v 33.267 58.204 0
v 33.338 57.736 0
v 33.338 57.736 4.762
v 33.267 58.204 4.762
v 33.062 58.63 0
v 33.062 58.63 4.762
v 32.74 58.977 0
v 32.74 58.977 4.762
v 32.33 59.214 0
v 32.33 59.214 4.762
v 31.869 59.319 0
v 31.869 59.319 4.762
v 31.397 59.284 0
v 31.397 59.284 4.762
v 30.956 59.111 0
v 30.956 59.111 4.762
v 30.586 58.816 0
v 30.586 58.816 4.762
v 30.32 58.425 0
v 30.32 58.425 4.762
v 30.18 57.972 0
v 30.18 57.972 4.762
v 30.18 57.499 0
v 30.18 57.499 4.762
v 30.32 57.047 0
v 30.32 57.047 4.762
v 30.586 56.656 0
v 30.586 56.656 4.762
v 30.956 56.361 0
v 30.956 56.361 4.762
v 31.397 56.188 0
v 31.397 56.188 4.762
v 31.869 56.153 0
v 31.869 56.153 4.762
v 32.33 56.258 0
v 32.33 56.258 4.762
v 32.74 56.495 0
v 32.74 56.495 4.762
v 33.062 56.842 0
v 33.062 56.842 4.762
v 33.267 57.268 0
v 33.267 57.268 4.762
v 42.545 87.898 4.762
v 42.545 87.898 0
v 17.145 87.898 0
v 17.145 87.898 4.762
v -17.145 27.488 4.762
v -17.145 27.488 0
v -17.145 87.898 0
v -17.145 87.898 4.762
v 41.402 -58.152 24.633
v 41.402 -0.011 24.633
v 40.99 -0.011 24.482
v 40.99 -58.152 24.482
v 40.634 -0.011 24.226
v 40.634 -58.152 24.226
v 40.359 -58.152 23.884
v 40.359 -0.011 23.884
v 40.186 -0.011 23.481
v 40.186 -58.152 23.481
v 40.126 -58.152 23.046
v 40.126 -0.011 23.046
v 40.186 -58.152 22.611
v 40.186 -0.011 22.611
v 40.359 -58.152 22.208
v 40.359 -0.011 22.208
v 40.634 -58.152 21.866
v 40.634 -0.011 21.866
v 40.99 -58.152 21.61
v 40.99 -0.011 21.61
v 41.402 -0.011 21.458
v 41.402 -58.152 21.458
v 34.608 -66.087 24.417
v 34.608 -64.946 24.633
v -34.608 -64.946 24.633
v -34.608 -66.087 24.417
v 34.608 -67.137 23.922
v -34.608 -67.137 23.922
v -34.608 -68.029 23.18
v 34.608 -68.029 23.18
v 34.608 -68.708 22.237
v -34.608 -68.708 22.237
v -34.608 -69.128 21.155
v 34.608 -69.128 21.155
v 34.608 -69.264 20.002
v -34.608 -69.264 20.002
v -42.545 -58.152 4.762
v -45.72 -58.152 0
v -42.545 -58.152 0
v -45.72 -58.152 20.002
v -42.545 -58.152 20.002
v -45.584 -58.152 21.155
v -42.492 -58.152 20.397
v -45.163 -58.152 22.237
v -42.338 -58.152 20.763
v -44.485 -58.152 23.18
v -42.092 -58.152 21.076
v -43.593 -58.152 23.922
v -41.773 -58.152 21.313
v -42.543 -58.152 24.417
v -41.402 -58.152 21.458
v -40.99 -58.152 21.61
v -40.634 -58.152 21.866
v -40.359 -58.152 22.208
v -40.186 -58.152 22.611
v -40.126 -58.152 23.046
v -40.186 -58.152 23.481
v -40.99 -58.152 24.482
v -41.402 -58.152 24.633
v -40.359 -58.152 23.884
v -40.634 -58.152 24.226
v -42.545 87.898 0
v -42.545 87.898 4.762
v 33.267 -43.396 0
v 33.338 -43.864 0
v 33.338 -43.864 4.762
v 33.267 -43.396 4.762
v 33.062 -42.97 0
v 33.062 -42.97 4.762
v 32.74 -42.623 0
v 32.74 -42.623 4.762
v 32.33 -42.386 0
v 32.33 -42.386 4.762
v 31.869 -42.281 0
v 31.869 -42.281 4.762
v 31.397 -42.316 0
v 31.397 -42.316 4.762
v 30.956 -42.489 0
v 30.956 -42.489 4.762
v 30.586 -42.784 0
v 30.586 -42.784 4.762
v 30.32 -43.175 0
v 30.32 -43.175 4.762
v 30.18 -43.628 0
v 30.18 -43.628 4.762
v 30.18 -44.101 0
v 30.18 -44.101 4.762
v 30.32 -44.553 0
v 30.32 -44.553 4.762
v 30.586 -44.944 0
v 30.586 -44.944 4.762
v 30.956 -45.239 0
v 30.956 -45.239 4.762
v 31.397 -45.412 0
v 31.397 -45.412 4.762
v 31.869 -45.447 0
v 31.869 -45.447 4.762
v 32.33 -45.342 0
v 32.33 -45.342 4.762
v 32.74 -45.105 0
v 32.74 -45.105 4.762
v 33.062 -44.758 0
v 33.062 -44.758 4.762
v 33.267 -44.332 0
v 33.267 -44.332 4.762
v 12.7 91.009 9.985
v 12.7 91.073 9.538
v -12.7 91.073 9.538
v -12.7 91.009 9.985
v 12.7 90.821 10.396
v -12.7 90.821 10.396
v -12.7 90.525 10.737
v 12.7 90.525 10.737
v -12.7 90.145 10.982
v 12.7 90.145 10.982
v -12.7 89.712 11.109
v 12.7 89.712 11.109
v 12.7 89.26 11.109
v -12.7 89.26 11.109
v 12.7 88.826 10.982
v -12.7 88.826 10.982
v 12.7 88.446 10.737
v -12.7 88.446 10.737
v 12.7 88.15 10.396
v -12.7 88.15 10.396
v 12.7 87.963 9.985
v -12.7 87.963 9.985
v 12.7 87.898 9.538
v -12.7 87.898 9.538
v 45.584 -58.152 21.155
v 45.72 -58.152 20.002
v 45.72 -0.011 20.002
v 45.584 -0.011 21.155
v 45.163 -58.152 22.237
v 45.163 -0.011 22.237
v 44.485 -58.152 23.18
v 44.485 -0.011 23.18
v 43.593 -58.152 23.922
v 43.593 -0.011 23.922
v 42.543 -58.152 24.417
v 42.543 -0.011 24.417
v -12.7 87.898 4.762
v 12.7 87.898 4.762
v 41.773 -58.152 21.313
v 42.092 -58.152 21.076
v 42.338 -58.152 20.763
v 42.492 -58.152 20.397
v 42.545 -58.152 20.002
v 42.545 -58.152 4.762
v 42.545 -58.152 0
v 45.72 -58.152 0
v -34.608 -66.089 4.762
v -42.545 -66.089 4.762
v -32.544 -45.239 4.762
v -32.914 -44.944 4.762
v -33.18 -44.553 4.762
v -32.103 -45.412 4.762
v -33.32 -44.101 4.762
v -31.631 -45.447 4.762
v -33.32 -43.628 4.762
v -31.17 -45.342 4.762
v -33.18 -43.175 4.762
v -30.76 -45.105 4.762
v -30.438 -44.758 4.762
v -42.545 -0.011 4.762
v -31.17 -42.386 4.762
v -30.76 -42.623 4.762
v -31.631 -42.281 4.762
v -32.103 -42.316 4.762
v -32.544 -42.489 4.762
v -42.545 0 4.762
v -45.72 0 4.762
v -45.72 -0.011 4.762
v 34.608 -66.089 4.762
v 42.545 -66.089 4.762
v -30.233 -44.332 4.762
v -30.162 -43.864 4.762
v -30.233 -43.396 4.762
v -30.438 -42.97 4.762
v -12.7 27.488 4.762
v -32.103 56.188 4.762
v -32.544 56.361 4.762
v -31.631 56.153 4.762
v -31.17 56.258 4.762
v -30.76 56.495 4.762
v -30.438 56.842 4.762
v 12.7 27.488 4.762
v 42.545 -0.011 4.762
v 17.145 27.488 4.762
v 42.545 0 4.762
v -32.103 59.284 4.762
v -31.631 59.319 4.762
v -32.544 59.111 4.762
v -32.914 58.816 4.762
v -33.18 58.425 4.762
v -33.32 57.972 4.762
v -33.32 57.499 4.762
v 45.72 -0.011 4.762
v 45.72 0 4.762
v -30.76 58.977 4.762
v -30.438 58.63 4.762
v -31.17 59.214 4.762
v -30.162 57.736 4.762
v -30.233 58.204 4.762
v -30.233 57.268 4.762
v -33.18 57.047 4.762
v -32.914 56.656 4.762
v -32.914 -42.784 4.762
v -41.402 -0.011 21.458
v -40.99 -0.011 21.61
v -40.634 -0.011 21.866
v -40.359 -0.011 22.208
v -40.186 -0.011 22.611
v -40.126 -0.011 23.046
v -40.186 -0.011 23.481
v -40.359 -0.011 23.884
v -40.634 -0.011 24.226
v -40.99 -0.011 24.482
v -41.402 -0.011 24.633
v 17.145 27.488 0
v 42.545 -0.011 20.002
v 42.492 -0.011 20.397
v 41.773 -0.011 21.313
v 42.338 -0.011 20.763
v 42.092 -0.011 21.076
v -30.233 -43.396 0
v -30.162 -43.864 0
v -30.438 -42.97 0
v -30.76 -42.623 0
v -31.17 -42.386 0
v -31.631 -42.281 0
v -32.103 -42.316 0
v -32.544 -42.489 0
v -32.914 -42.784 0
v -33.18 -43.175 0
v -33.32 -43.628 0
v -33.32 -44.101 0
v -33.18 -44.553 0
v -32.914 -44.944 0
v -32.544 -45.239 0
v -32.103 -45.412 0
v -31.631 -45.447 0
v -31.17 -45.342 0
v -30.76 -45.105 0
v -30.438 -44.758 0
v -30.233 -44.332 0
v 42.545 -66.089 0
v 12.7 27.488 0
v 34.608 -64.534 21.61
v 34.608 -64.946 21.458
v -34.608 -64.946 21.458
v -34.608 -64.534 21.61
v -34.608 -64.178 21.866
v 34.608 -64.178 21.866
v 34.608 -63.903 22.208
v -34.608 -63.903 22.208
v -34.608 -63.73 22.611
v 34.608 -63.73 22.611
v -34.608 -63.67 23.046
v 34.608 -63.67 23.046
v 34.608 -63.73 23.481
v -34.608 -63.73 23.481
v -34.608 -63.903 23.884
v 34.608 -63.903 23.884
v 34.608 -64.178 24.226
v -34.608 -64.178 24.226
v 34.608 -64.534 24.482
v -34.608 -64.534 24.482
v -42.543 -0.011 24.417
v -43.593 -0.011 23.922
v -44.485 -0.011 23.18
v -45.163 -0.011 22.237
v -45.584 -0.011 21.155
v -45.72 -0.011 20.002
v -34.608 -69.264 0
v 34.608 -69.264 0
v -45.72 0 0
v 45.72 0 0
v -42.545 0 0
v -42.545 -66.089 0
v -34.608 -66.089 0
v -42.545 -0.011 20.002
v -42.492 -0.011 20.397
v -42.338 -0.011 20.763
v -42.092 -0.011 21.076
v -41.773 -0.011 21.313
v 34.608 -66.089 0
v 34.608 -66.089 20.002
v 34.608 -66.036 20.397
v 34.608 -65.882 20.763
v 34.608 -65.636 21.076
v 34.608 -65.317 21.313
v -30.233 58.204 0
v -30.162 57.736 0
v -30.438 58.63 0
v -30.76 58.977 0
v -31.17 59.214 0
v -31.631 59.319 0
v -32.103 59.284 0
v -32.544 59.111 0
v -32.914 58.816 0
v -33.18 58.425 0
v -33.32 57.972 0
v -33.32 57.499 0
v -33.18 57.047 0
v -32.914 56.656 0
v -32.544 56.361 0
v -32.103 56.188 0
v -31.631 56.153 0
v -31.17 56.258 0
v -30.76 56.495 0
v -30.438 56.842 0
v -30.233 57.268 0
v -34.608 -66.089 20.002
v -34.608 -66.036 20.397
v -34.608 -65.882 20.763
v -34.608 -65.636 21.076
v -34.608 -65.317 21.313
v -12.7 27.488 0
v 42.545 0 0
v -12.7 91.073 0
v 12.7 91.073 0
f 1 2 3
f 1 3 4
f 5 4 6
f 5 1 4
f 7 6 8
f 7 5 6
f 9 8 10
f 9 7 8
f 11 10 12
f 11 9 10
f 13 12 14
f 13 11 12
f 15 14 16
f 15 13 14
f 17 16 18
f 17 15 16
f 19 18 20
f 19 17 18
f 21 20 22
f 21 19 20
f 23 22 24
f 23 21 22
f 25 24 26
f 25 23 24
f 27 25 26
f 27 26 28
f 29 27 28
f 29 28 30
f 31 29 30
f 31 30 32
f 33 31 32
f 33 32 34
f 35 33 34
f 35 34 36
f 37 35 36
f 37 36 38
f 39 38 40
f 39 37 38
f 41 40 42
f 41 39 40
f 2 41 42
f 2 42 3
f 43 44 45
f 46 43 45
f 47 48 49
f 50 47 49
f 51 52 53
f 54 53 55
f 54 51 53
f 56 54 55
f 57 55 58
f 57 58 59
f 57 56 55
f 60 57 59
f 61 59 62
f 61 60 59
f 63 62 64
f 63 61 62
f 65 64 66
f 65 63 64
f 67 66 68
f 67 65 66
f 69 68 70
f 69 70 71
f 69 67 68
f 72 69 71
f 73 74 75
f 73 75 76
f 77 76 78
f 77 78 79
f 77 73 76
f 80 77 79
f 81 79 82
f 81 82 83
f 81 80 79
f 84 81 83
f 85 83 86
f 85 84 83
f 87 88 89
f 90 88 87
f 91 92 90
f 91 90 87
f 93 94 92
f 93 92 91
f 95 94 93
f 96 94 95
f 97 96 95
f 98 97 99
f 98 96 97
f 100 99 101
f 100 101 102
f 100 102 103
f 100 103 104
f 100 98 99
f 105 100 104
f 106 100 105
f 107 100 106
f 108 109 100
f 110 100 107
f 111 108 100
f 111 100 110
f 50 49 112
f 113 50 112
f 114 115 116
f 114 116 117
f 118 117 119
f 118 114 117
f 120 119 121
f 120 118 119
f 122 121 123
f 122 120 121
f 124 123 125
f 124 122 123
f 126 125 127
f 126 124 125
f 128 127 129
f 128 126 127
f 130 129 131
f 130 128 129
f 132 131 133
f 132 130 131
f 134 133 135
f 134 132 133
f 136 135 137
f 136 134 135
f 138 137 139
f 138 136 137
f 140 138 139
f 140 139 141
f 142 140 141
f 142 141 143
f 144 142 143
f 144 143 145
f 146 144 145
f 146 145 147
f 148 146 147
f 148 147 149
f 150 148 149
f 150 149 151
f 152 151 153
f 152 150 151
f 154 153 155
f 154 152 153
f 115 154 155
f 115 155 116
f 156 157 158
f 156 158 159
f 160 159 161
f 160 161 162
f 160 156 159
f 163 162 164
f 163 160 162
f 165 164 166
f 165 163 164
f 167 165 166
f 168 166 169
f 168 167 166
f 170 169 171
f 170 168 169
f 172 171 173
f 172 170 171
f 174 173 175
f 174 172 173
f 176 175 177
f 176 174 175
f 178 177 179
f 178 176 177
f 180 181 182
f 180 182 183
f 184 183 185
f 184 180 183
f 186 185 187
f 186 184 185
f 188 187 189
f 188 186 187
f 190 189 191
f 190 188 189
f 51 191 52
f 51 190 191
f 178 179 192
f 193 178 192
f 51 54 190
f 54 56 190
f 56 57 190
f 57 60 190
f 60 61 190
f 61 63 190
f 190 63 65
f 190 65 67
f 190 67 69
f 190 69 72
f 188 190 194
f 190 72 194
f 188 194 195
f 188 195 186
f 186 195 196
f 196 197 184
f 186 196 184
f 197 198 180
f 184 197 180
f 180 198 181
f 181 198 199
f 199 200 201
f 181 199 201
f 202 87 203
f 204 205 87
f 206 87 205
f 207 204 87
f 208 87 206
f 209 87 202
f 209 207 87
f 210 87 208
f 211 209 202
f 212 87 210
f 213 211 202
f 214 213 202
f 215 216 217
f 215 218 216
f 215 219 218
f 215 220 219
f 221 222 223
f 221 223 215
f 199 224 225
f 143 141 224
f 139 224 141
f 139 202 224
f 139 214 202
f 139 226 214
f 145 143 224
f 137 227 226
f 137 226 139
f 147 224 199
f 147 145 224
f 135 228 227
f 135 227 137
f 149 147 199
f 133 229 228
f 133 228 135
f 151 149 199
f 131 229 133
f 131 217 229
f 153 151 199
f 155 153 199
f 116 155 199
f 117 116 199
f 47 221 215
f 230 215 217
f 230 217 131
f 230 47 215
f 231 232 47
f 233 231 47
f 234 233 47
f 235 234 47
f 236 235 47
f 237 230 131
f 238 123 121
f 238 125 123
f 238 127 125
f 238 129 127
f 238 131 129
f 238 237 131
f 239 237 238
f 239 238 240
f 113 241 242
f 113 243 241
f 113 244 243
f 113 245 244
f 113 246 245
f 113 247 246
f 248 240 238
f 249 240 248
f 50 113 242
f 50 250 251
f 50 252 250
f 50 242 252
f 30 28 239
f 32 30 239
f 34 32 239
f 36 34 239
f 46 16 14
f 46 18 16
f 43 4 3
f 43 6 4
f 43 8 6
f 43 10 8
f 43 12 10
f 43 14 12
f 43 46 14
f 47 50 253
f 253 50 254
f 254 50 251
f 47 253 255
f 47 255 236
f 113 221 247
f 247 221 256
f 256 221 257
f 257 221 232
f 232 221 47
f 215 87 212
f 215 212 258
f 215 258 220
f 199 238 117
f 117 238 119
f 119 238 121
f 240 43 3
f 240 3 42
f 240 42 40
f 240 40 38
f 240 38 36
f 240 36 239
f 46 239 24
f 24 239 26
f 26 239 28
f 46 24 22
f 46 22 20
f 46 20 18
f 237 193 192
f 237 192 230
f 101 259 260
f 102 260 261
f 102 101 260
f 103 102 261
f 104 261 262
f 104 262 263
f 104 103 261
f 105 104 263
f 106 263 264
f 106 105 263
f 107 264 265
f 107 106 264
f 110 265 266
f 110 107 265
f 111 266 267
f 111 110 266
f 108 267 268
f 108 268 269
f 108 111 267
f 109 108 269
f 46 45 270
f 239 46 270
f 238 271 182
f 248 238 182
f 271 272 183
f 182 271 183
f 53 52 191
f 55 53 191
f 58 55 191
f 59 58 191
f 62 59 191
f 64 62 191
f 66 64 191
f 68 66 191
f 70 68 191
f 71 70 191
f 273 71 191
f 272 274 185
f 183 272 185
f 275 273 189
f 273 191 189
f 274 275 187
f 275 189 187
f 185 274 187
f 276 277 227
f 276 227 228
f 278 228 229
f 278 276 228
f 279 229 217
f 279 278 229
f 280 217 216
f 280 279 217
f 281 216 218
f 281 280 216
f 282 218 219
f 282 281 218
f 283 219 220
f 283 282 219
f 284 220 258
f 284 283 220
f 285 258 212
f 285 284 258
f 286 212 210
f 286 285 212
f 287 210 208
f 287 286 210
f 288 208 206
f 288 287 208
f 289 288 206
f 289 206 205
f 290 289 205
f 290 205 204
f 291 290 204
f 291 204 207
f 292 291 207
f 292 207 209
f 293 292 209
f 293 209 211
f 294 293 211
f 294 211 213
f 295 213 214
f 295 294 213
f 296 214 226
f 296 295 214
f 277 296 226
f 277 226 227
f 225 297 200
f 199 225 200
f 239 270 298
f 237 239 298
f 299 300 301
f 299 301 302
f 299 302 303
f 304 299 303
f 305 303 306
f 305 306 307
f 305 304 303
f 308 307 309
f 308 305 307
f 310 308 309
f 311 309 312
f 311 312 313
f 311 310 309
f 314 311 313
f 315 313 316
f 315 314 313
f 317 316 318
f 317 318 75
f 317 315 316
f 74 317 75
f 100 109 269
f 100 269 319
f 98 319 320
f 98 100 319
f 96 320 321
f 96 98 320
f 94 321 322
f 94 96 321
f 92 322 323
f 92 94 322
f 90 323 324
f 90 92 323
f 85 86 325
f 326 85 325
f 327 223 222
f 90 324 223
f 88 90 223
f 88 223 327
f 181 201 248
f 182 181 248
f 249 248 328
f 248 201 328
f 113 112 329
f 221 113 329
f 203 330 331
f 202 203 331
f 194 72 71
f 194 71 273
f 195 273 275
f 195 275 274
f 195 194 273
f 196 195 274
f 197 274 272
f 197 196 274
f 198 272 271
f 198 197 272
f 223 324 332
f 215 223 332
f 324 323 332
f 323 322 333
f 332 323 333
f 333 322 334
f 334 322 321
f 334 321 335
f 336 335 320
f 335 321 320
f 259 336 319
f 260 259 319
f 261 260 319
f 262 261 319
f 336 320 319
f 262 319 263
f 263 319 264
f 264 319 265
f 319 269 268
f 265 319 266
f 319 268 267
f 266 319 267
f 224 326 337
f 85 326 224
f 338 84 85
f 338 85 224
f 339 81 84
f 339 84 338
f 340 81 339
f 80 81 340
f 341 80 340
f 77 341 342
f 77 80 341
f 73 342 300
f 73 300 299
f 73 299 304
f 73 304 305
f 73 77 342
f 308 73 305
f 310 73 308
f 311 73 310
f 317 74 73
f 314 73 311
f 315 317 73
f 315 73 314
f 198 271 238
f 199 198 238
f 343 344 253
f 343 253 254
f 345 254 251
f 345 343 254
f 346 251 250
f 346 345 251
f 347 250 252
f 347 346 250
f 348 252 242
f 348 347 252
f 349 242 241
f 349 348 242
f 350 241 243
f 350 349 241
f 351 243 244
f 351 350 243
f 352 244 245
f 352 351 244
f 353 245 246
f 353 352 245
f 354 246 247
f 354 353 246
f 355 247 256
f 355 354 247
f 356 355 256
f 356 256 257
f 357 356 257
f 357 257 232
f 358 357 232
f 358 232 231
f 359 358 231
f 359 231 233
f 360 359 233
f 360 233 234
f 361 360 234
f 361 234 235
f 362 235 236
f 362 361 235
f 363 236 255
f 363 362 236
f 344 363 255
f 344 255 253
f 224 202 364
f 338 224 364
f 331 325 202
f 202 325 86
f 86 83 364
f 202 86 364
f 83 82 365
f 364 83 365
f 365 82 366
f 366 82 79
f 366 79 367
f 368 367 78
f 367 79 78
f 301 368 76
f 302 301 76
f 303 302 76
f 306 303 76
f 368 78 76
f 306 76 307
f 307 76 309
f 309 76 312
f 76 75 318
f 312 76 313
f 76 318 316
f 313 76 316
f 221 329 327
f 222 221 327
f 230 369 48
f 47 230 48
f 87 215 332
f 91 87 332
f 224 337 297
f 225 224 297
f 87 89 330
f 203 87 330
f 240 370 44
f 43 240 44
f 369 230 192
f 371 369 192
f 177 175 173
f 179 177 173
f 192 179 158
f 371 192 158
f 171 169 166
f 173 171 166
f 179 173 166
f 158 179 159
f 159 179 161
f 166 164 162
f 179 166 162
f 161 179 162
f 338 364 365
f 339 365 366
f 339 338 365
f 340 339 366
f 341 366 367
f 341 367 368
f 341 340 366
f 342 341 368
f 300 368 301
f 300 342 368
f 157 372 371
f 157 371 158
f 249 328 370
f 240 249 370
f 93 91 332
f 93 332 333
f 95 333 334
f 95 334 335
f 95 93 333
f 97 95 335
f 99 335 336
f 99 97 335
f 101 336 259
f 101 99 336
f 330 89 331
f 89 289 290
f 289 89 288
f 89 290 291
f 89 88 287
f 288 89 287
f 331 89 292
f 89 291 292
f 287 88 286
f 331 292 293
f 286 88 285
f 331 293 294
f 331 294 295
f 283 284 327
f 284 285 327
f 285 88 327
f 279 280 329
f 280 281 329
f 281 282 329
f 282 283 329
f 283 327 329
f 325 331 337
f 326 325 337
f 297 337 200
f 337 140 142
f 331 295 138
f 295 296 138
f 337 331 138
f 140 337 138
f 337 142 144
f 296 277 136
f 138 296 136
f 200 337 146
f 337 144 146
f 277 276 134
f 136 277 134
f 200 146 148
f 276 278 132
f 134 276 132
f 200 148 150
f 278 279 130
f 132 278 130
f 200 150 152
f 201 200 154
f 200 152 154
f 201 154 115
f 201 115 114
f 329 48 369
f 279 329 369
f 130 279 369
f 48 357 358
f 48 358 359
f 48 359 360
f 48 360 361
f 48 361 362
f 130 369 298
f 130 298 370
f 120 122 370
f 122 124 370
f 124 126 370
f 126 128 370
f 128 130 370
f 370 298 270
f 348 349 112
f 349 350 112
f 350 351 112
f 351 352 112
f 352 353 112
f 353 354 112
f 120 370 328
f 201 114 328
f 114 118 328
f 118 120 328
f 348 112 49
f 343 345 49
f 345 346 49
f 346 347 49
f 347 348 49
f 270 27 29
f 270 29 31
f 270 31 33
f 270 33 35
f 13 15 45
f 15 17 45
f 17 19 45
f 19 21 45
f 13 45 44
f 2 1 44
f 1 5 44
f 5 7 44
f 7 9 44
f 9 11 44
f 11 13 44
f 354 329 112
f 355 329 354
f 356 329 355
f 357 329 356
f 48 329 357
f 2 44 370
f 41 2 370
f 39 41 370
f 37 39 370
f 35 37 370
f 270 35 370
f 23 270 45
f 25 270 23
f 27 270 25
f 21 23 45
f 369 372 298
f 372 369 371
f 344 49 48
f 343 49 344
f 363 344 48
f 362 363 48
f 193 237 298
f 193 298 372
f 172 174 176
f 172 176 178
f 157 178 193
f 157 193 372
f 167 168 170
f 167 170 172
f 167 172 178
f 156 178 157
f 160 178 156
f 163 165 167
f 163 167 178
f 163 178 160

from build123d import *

# Parameters (mm, degrees)
F0_R     = 1.5875
F1_DEPTH = 4.7625
F3_DEPTH = 58.1406
F5_DEPTH = 69.215
F7_DEPTH = 25.4


with BuildPart() as f1:
    # F0 (on Top) → F1 (new body)
    with BuildSketch(Plane.XY):
        Polygon((-17.145, 87.89836), (-42.545, 87.89836), (-42.545, 0), (-45.72, 0), (-45.72, -58.15164), (-42.545, -58.15164), (-42.545, -66.08914), (-34.6075, -66.08914), (-34.6075, -69.26414), (34.6075, -69.26414), (34.6075, -66.08914), (42.545, -66.08914), (42.545, -58.15164), (45.72, -58.15164), (45.72, 0), (42.545, 0), (42.545, 87.89836), (17.145, 87.89836), (17.145, 27.487862), (12.7, 27.487862), (12.7, 91.07336), (-12.7, 91.07336), (-12.7, 27.487862), (-17.145, 27.487862), align=None)
        with Locations((-31.75, -43.86414)):
            Circle(F0_R, mode=Mode.SUBTRACT)
        with Locations((31.75, -43.86414)):
            Circle(F0_R, mode=Mode.SUBTRACT)
        with Locations((-31.75, 57.73586)):
            Circle(F0_R, mode=Mode.SUBTRACT)
        with Locations((31.75, 57.73586)):
            Circle(F0_R, mode=Mode.SUBTRACT)
    extrude(amount=F1_DEPTH)

    # F2 (on face) → F3 (join)
    with BuildSketch(Plane.XZ.offset(58.15164)):
        with BuildLine():
            Line((-45.72, 20.0025), (-45.72, 4.7625))
            Line((-45.72, 4.7625), (-42.545, 4.7625))
            Line((-42.545, 4.7625), (-42.545, 20.0025))
            ThreePointArc((-42.545, 20.0025), (-42.225108, 20.927946), (-41.402, 21.458299))
            ThreePointArc((-41.402, 21.458299), (-40.126284, 23.045799), (-41.402, 24.633299))
            ThreePointArc((-41.402, 24.633299), (-44.485221, 23.179692), (-45.72, 20.0025))
        make_face()
        with BuildLine():
            Line((42.545, 20.0025), (42.545, 4.7625))
            Line((42.545, 4.7625), (45.72, 4.7625))
            Line((45.72, 4.7625), (45.72, 20.0025))
            ThreePointArc((45.72, 20.0025), (44.485221, 23.179692), (41.402, 24.633299))
            ThreePointArc((41.402, 24.633299), (40.126284, 23.045799), (41.402, 21.458299))
            ThreePointArc((41.402, 21.458299), (42.225108, 20.927946), (42.545, 20.0025))
        make_face()
    extrude(amount=-F3_DEPTH)

    # F4 (on face) → F5 (join)
    with BuildSketch(Plane.YZ.offset(34.6075)):
        with BuildLine():
            Line((-69.26414, 20.0025), (-69.26414, 4.7625))
            Line((-69.26414, 4.7625), (-66.08914, 4.7625))
            Line((-66.08914, 4.7625), (-66.08914, 20.0025))
            ThreePointArc((-66.08914, 20.0025), (-65.769247, 20.927946), (-64.94614, 21.458299))
            ThreePointArc((-64.94614, 21.458299), (-63.670424, 23.045799), (-64.94614, 24.633299))
            ThreePointArc((-64.94614, 24.633299), (-68.029361, 23.179692), (-69.26414, 20.0025))
        make_face()
    extrude(amount=-F5_DEPTH)

    # F6 (on face) → F7 (join)
    with BuildSketch(Plane.YZ.offset(12.7)):
        with BuildLine():
            Line((87.89836, 4.7625), (91.07336, 4.7625))
            Line((91.07336, 4.7625), (91.07336, 9.5377))
            ThreePointArc((91.07336, 9.5377), (89.48586, 11.1252), (87.89836, 9.5377))
            Line((87.89836, 9.5377), (87.89836, 4.7625))
        make_face()
    extrude(amount=-F7_DEPTH)


solid = f1.part
